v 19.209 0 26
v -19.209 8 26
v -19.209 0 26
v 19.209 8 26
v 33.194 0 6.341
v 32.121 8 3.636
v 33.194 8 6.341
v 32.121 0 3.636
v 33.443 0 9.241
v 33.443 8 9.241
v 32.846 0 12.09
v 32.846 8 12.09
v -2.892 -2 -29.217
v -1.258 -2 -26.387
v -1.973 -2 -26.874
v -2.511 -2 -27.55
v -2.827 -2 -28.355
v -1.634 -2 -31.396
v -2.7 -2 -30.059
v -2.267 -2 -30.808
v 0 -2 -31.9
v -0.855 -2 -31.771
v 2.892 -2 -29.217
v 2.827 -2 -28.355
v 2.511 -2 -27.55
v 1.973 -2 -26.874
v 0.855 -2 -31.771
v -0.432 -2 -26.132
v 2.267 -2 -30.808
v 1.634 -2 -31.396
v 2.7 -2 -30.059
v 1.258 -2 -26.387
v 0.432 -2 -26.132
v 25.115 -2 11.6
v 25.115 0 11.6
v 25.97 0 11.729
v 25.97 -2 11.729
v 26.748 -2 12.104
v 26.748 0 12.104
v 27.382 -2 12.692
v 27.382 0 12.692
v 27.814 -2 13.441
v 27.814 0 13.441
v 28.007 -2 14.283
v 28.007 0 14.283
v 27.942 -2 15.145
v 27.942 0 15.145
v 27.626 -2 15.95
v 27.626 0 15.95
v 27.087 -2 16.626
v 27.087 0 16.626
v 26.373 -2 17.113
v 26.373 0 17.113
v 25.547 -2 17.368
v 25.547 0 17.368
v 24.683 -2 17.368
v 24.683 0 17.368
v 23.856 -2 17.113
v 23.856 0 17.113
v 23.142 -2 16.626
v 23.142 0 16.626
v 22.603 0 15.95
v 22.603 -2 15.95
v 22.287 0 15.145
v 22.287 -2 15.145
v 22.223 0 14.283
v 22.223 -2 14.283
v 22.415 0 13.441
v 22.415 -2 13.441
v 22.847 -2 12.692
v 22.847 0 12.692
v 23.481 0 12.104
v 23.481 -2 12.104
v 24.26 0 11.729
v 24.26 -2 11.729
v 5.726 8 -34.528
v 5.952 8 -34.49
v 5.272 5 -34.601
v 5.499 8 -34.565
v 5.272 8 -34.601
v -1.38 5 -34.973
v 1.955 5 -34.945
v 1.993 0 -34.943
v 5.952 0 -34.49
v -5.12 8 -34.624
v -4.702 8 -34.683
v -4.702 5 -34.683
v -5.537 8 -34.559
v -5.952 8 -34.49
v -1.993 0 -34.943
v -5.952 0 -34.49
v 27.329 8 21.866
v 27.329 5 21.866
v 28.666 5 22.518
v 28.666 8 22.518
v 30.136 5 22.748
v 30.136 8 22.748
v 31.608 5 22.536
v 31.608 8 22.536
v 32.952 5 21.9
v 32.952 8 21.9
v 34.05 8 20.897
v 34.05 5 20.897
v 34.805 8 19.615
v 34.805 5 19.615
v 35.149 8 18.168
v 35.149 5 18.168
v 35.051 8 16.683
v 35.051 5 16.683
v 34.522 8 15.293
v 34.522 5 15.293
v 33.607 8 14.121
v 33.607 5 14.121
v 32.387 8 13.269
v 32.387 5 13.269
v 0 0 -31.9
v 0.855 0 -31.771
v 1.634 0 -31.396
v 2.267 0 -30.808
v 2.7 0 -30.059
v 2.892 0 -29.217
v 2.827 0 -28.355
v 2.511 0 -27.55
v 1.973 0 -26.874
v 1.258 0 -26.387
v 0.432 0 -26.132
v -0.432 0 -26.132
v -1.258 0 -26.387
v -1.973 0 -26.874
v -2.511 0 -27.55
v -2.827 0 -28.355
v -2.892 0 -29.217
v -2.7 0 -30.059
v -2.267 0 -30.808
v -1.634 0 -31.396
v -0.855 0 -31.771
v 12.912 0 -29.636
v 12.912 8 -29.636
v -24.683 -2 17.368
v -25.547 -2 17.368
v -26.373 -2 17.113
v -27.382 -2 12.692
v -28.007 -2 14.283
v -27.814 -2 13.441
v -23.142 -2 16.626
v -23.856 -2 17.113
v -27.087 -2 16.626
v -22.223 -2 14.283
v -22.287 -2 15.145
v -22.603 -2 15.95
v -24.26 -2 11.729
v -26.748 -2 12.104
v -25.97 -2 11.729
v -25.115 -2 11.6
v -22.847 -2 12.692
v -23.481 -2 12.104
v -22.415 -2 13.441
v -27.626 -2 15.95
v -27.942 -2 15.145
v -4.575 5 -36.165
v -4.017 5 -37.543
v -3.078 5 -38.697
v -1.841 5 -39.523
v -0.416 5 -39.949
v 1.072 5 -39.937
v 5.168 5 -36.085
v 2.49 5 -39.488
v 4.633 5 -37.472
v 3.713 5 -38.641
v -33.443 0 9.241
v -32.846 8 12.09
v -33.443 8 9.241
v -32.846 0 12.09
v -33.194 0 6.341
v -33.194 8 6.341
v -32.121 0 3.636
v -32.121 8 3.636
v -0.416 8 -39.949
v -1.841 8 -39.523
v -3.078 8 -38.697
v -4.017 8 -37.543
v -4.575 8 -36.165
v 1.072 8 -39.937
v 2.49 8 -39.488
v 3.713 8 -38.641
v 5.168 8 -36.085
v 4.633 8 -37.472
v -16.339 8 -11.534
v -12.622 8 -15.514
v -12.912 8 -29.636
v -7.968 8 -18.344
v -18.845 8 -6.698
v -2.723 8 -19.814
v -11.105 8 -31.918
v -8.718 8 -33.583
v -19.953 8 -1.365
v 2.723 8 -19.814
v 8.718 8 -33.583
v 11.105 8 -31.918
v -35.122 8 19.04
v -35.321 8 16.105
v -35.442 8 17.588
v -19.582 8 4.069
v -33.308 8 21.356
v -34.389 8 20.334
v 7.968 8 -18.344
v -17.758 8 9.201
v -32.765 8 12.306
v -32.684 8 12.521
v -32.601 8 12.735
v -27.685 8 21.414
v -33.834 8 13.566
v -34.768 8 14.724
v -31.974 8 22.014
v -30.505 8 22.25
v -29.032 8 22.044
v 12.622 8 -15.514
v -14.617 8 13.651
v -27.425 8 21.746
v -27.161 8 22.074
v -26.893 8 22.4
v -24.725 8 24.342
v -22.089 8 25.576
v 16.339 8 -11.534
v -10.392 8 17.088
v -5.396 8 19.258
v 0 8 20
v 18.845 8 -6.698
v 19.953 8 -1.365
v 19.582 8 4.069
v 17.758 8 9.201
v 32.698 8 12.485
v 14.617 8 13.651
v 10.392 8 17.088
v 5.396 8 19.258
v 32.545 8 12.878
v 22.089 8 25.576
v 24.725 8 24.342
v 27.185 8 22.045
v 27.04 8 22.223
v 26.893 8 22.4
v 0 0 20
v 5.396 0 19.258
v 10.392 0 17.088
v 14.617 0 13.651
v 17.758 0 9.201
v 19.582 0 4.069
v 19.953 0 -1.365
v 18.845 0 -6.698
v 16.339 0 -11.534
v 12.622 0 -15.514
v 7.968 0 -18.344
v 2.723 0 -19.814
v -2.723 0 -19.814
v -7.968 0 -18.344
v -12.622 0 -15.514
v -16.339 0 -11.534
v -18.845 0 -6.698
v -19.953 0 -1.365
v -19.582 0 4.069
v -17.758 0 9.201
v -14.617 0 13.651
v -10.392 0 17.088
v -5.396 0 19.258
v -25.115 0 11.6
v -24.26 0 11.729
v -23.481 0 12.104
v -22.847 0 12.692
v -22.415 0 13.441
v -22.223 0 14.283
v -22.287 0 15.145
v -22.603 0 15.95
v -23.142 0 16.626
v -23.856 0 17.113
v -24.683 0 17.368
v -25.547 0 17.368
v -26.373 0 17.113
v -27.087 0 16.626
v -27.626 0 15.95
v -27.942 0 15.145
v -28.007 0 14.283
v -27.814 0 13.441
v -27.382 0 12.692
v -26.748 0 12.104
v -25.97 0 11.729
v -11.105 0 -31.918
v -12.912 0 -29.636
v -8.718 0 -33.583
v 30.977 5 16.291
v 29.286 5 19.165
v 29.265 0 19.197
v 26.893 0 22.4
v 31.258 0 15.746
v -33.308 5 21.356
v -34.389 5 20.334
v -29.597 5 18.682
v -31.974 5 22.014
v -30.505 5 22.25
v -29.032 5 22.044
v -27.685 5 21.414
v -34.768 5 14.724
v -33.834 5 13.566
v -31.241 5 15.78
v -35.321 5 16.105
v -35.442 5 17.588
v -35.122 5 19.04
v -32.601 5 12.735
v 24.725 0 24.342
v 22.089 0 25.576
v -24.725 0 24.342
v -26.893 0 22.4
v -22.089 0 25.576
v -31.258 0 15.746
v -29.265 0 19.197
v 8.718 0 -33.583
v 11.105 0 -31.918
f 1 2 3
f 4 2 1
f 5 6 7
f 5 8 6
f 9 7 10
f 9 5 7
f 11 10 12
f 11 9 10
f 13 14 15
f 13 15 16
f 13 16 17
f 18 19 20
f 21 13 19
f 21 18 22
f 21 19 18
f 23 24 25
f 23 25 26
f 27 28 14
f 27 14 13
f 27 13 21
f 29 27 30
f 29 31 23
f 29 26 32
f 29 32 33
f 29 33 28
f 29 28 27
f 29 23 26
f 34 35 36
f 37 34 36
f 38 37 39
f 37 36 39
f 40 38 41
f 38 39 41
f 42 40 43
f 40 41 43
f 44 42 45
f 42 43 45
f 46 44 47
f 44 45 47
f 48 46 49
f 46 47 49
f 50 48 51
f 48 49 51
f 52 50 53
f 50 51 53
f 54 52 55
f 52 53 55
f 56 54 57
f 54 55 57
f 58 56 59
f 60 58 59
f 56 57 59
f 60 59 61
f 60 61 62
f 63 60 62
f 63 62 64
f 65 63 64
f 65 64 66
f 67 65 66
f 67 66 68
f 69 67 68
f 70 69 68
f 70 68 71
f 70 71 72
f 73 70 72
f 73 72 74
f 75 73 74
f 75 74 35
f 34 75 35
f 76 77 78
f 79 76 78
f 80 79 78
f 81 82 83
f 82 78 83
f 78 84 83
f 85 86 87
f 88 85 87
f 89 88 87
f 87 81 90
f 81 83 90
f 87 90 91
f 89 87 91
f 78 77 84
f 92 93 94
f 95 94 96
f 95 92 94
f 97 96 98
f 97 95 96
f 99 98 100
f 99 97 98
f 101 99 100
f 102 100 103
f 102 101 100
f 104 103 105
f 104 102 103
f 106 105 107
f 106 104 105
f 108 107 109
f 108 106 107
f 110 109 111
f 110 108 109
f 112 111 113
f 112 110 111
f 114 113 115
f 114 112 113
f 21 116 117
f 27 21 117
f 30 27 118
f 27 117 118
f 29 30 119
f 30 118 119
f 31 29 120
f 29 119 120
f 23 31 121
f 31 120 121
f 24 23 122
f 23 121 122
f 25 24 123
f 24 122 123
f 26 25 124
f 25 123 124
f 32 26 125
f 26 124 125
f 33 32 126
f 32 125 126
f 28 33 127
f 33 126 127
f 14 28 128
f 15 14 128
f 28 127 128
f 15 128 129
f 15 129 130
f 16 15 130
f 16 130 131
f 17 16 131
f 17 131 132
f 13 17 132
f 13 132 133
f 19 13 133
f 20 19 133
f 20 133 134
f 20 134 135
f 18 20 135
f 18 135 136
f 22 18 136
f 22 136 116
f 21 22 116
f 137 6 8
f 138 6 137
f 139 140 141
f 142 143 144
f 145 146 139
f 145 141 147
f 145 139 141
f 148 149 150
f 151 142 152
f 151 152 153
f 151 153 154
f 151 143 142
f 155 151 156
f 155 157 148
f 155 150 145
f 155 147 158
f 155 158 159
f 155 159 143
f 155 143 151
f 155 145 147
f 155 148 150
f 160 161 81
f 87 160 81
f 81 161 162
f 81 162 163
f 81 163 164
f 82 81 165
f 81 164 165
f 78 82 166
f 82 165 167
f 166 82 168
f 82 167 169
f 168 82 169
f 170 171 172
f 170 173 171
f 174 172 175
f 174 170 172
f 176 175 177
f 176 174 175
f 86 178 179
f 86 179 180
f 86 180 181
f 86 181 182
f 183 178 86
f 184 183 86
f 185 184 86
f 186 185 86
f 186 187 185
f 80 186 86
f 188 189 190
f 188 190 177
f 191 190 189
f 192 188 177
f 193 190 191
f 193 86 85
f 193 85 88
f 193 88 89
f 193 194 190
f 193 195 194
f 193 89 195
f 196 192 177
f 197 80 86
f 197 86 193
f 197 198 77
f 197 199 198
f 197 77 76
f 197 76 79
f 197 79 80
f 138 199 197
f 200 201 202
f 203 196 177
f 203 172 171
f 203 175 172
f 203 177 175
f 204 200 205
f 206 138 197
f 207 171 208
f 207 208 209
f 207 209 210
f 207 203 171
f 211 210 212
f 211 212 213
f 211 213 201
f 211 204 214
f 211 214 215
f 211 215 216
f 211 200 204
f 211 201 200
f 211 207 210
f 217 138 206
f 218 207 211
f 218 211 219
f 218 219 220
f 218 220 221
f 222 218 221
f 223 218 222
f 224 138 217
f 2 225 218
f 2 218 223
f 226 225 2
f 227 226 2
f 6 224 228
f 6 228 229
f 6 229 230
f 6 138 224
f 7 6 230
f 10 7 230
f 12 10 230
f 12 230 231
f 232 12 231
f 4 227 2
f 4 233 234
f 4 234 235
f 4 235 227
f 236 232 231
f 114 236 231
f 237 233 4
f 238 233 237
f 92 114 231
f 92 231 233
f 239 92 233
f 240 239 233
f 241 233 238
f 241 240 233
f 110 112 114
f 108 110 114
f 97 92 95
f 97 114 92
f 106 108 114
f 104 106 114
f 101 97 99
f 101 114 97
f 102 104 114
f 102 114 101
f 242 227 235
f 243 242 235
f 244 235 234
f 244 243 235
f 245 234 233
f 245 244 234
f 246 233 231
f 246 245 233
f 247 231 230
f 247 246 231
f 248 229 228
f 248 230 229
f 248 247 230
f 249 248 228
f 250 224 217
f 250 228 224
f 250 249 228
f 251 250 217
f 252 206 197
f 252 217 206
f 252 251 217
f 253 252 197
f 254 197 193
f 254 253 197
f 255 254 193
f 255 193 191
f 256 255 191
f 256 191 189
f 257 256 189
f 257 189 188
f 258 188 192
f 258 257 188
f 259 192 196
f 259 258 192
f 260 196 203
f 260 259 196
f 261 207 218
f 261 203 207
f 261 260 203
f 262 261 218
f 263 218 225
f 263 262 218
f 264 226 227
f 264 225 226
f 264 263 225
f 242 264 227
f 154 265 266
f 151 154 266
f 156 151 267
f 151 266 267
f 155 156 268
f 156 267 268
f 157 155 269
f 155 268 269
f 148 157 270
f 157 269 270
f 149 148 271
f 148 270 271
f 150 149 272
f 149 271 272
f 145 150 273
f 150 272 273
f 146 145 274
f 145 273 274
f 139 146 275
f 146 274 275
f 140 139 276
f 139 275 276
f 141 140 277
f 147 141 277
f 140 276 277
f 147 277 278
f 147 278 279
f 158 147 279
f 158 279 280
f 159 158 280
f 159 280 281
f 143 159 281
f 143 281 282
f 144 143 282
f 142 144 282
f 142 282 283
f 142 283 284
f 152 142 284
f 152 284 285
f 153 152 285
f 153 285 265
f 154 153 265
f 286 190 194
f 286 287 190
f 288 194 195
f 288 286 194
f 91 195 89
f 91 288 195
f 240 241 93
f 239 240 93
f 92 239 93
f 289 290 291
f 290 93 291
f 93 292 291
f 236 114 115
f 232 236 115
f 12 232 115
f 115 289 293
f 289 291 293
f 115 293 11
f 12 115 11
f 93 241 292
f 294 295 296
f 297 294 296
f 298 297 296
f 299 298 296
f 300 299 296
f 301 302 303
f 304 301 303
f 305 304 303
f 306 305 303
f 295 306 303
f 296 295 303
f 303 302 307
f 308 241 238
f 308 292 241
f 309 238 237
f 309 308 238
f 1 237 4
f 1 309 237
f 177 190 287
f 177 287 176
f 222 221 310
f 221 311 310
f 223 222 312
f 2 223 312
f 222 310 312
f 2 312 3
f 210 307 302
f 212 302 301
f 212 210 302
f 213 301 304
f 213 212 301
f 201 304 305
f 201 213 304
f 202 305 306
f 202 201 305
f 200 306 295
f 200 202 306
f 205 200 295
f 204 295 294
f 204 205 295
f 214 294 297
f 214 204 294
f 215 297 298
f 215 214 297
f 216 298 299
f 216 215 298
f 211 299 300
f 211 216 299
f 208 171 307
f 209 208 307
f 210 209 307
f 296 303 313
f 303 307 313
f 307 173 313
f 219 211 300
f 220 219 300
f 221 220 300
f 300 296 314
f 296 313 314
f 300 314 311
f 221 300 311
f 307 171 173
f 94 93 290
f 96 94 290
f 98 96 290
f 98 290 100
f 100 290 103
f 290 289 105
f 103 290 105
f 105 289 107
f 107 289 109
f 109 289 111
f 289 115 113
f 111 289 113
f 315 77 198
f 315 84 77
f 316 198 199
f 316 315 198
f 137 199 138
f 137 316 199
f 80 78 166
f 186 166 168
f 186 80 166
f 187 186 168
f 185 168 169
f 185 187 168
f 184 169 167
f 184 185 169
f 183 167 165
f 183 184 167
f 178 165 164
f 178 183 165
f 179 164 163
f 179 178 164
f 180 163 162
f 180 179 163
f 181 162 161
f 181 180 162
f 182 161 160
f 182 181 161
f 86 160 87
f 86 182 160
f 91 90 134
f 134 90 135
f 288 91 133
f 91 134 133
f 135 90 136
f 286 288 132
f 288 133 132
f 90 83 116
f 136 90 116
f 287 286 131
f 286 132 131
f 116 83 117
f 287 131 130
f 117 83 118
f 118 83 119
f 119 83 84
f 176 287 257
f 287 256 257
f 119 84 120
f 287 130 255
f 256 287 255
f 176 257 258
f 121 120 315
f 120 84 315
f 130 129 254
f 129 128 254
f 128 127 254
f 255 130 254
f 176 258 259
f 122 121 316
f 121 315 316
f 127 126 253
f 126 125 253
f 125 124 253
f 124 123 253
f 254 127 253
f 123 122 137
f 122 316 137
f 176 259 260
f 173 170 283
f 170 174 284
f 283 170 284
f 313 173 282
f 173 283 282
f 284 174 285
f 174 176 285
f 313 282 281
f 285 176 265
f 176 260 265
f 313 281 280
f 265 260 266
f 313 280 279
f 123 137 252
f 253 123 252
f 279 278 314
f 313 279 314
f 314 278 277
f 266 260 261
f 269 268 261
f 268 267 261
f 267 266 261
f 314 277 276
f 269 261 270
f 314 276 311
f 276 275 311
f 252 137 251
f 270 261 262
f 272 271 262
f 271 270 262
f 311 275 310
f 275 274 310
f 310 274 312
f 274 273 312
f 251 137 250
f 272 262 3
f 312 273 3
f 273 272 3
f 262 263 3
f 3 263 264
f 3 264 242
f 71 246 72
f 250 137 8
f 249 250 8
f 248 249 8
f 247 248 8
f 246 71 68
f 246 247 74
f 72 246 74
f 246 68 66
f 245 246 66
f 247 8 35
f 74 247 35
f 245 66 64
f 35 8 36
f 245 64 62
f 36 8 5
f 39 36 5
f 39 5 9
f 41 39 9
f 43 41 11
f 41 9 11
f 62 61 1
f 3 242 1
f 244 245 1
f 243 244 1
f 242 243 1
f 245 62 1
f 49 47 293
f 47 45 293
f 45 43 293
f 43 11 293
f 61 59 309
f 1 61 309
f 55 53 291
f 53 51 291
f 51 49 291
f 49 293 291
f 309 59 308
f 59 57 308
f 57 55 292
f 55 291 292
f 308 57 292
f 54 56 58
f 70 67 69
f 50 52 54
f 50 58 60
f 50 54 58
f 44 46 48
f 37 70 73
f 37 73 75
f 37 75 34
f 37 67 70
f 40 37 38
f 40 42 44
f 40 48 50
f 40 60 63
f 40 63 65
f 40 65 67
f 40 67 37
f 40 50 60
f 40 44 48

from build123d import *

# Parameters (mm, degrees)
SKETCH1_R                = 20
BOSS_EXTRUDE1_DEPTH      = 3.5
SKETCH2_R                = 35
SKETCH2_R_2              = 20
SKETCH2_R_3              = 2.8
BOSS_EXTRUDE2_DEPTH      = 8
BOSS_EXTRUDE3_DEPTH      = 2
BOSS_EXTRUDE3_DEPTH_BACK = 8
SKETCH4_R                = 2.9
SKETCH5_R                = 5
BOSS_EXTRUDE4_DEPTH      = 3
CUT_EXTRUDE1_START       = -10
SKETCH3_R                = 20
CUT_EXTRUDE1_DEPTH       = 10
SKETCH9_R                = 18.5
BOSS_EXTRUDE5_DEPTH      = 3.5
SKETCH10_R               = 18.5
SKETCH10_R_2             = 17.5
BOSS_EXTRUDE6_DEPTH      = 3.5
SKETCH11_W               = 2
SKETCH11_H               = 6.599117057
BOSS_EXTRUDE7_DEPTH      = 2
SKETCH12_R               = 72.135852014
CUT_EXTRUDE2_DEPTH       = 22
FILLET1_R                = 10
CUT_EXTRUDE3_START       = -10
SKETCH13_R               = 20
CUT_EXTRUDE3_DEPTH       = 10


with BuildPart() as part:
    # Sketch1 → Boss-Extrude1 (new body)
    with BuildSketch(Plane(origin=(0, 0, 0), x_dir=(1, 0, 0), z_dir=(0, 1, 0))):
        with Locations(Location((0, 0, 0), (0, 0, 270))):
            Circle(SKETCH1_R)
    extrude(amount=BOSS_EXTRUDE1_DEPTH)

    # Sketch2 → Boss-Extrude2 (add)
    with BuildSketch(Plane(origin=(0, 0, 0), x_dir=(1, 0, 0), z_dir=(0, 1, 0))):
        with Locations(Location((0, 0, 0), (0, 0, 270))):
            Circle(SKETCH2_R)
        with Locations(Location((0, 0, 0), (0, 0, 270))):
            Circle(SKETCH2_R_2, mode=Mode.SUBTRACT)
        with Locations(Location((0, 29, 0), (0, 0, 270))):
            Circle(SKETCH2_R_3, mode=Mode.SUBTRACT)
        with Locations(Location((25.11473671, -14.5, 0), (0, 0, 270))):
            Circle(SKETCH2_R_3, mode=Mode.SUBTRACT)
        with Locations(Location((-25.11473671, -14.5, 0), (0, 0, 270))):
            Circle(SKETCH2_R_3, mode=Mode.SUBTRACT)
    extrude(amount=BOSS_EXTRUDE2_DEPTH)

    # Sketch4 → Boss-Extrude3 (add, two sides: drawn at the far end of the back side and taken through both)
    with BuildSketch(Plane.XZ.offset(-BOSS_EXTRUDE3_DEPTH_BACK)):
        with Locations(Location((-25.11473671, 14.5, 0), (0, 0, 270))):
            Circle(SKETCH4_R)
        with Locations(Location((25.11473671, 14.5, 0), (0, 0, 270))):
            Circle(SKETCH4_R)
        with Locations(Location((0, -29, 0), (0, 0, 270))):
            Circle(SKETCH4_R)
    extrude(amount=BOSS_EXTRUDE3_DEPTH + BOSS_EXTRUDE3_DEPTH_BACK)

    # Sketch5 → Boss-Extrude4 (add)
    with BuildSketch(Plane(origin=(0, 8, 0), x_dir=(1, 0, 0), z_dir=(0, 1, 0))):
        with Locations((-30.453629482, -17.250404383)):
            Circle(SKETCH5_R)
        with Locations((0.28752632, 34.99881896)):
            Circle(SKETCH5_R)
        with Locations((30.166103162, -17.748414577)):
            Circle(SKETCH5_R)
    extrude(amount=-BOSS_EXTRUDE4_DEPTH)

    # Sketch3 → Cut-Extrude1 (cut)
    with BuildSketch(Plane(origin=(0, 3.5, 0), x_dir=(1, 0, 0), z_dir=(0, 1, 0)).offset(CUT_EXTRUDE1_START)):
        with Locations(Location((0, 0, 0), (0, 0, 270))):
            Circle(SKETCH3_R)
    extrude(amount=CUT_EXTRUDE1_DEPTH, mode=Mode.SUBTRACT)



with BuildPart() as body_2:
    # Sketch9 → Boss-Extrude5 (new body)
    with BuildSketch(Plane(origin=(0, 8, 0), x_dir=(1, 0, 0), z_dir=(0, 1, 0))):
        with Locations(Location((0, 0, 0), (0, 0, 270))):
            Circle(SKETCH9_R)
    extrude(amount=-BOSS_EXTRUDE5_DEPTH)

    # Sketch10 → Boss-Extrude6 (add)
    with BuildSketch(Plane(origin=(0, 4.5, 0), x_dir=(-1, 0, 0), z_dir=(0, -1, 0))):
        with Locations(Location((0, 0, 0), (0, 0, 270))):
            Circle(SKETCH10_R)
        with Locations(Location((0, 0, 0), (0, 0, 90))):
            Circle(SKETCH10_R_2, mode=Mode.SUBTRACT)
    extrude(amount=BOSS_EXTRUDE6_DEPTH)


with BuildPart() as part_1:
    add(part.part)

    add(body_2.part)  # Boss-Extrude7 merges body 2
    # Sketch11 → Boss-Extrude7 (add)
    with BuildSketch(Plane(origin=(0, 8, 0), x_dir=(1, 0, 0), z_dir=(0, 1, 0))):
        Polygon((19.946286756, -10.36129349), (14.231283742, -7.061734961), (13.231283742, -8.793785769), (18.946286756, -12.093344297), align=None)
        with Locations((0, 19.155079259)):
            Rectangle(SKETCH11_W, SKETCH11_H)
        Polygon((-18.946286756, -12.093344297), (-13.231283742, -8.793785769), (-14.231283742, -7.061734961), (-19.946286756, -10.36129349), align=None)
    extrude(amount=-BOSS_EXTRUDE7_DEPTH)

    # Sketch12 → Cut-Extrude2 (cut)
    with BuildSketch(Plane(origin=(0, 8, 0), x_dir=(1, 0, 0), z_dir=(0, 1, 0))):
        Circle(SKETCH12_R)
        Polygon((0, 52), (-45.033320997, -26), (45.033320997, -26), align=None, mode=Mode.SUBTRACT)
    extrude(amount=-CUT_EXTRUDE2_DEPTH, mode=Mode.SUBTRACT)

    # Fillet1
    fillet1_edges = [part_1.edges().sort_by_distance(p)[0] for p in [
        (34.232035012, 4, 7.291623888),
        (10.801285985, 4, -33.291623888),
        (-23.430749028, 4, 26),
        (23.430749028, 4, 26),
        (-10.801285985, 4, -33.291623888),
        (-34.232035012, 4, 7.291623888),
    ]]
    fillet(fillet1_edges, radius=FILLET1_R)

    # Sketch13 → Cut-Extrude3 (cut)
    with BuildSketch(Plane(origin=(0, 8, 0), x_dir=(1, 0, 0), z_dir=(0, 1, 0)).offset(CUT_EXTRUDE3_START)):
        with Locations(Location((0, 0, 0), (0, 0, 270))):
            Circle(SKETCH13_R)
    extrude(amount=CUT_EXTRUDE3_DEPTH, mode=Mode.SUBTRACT)


solid = part_1.part
